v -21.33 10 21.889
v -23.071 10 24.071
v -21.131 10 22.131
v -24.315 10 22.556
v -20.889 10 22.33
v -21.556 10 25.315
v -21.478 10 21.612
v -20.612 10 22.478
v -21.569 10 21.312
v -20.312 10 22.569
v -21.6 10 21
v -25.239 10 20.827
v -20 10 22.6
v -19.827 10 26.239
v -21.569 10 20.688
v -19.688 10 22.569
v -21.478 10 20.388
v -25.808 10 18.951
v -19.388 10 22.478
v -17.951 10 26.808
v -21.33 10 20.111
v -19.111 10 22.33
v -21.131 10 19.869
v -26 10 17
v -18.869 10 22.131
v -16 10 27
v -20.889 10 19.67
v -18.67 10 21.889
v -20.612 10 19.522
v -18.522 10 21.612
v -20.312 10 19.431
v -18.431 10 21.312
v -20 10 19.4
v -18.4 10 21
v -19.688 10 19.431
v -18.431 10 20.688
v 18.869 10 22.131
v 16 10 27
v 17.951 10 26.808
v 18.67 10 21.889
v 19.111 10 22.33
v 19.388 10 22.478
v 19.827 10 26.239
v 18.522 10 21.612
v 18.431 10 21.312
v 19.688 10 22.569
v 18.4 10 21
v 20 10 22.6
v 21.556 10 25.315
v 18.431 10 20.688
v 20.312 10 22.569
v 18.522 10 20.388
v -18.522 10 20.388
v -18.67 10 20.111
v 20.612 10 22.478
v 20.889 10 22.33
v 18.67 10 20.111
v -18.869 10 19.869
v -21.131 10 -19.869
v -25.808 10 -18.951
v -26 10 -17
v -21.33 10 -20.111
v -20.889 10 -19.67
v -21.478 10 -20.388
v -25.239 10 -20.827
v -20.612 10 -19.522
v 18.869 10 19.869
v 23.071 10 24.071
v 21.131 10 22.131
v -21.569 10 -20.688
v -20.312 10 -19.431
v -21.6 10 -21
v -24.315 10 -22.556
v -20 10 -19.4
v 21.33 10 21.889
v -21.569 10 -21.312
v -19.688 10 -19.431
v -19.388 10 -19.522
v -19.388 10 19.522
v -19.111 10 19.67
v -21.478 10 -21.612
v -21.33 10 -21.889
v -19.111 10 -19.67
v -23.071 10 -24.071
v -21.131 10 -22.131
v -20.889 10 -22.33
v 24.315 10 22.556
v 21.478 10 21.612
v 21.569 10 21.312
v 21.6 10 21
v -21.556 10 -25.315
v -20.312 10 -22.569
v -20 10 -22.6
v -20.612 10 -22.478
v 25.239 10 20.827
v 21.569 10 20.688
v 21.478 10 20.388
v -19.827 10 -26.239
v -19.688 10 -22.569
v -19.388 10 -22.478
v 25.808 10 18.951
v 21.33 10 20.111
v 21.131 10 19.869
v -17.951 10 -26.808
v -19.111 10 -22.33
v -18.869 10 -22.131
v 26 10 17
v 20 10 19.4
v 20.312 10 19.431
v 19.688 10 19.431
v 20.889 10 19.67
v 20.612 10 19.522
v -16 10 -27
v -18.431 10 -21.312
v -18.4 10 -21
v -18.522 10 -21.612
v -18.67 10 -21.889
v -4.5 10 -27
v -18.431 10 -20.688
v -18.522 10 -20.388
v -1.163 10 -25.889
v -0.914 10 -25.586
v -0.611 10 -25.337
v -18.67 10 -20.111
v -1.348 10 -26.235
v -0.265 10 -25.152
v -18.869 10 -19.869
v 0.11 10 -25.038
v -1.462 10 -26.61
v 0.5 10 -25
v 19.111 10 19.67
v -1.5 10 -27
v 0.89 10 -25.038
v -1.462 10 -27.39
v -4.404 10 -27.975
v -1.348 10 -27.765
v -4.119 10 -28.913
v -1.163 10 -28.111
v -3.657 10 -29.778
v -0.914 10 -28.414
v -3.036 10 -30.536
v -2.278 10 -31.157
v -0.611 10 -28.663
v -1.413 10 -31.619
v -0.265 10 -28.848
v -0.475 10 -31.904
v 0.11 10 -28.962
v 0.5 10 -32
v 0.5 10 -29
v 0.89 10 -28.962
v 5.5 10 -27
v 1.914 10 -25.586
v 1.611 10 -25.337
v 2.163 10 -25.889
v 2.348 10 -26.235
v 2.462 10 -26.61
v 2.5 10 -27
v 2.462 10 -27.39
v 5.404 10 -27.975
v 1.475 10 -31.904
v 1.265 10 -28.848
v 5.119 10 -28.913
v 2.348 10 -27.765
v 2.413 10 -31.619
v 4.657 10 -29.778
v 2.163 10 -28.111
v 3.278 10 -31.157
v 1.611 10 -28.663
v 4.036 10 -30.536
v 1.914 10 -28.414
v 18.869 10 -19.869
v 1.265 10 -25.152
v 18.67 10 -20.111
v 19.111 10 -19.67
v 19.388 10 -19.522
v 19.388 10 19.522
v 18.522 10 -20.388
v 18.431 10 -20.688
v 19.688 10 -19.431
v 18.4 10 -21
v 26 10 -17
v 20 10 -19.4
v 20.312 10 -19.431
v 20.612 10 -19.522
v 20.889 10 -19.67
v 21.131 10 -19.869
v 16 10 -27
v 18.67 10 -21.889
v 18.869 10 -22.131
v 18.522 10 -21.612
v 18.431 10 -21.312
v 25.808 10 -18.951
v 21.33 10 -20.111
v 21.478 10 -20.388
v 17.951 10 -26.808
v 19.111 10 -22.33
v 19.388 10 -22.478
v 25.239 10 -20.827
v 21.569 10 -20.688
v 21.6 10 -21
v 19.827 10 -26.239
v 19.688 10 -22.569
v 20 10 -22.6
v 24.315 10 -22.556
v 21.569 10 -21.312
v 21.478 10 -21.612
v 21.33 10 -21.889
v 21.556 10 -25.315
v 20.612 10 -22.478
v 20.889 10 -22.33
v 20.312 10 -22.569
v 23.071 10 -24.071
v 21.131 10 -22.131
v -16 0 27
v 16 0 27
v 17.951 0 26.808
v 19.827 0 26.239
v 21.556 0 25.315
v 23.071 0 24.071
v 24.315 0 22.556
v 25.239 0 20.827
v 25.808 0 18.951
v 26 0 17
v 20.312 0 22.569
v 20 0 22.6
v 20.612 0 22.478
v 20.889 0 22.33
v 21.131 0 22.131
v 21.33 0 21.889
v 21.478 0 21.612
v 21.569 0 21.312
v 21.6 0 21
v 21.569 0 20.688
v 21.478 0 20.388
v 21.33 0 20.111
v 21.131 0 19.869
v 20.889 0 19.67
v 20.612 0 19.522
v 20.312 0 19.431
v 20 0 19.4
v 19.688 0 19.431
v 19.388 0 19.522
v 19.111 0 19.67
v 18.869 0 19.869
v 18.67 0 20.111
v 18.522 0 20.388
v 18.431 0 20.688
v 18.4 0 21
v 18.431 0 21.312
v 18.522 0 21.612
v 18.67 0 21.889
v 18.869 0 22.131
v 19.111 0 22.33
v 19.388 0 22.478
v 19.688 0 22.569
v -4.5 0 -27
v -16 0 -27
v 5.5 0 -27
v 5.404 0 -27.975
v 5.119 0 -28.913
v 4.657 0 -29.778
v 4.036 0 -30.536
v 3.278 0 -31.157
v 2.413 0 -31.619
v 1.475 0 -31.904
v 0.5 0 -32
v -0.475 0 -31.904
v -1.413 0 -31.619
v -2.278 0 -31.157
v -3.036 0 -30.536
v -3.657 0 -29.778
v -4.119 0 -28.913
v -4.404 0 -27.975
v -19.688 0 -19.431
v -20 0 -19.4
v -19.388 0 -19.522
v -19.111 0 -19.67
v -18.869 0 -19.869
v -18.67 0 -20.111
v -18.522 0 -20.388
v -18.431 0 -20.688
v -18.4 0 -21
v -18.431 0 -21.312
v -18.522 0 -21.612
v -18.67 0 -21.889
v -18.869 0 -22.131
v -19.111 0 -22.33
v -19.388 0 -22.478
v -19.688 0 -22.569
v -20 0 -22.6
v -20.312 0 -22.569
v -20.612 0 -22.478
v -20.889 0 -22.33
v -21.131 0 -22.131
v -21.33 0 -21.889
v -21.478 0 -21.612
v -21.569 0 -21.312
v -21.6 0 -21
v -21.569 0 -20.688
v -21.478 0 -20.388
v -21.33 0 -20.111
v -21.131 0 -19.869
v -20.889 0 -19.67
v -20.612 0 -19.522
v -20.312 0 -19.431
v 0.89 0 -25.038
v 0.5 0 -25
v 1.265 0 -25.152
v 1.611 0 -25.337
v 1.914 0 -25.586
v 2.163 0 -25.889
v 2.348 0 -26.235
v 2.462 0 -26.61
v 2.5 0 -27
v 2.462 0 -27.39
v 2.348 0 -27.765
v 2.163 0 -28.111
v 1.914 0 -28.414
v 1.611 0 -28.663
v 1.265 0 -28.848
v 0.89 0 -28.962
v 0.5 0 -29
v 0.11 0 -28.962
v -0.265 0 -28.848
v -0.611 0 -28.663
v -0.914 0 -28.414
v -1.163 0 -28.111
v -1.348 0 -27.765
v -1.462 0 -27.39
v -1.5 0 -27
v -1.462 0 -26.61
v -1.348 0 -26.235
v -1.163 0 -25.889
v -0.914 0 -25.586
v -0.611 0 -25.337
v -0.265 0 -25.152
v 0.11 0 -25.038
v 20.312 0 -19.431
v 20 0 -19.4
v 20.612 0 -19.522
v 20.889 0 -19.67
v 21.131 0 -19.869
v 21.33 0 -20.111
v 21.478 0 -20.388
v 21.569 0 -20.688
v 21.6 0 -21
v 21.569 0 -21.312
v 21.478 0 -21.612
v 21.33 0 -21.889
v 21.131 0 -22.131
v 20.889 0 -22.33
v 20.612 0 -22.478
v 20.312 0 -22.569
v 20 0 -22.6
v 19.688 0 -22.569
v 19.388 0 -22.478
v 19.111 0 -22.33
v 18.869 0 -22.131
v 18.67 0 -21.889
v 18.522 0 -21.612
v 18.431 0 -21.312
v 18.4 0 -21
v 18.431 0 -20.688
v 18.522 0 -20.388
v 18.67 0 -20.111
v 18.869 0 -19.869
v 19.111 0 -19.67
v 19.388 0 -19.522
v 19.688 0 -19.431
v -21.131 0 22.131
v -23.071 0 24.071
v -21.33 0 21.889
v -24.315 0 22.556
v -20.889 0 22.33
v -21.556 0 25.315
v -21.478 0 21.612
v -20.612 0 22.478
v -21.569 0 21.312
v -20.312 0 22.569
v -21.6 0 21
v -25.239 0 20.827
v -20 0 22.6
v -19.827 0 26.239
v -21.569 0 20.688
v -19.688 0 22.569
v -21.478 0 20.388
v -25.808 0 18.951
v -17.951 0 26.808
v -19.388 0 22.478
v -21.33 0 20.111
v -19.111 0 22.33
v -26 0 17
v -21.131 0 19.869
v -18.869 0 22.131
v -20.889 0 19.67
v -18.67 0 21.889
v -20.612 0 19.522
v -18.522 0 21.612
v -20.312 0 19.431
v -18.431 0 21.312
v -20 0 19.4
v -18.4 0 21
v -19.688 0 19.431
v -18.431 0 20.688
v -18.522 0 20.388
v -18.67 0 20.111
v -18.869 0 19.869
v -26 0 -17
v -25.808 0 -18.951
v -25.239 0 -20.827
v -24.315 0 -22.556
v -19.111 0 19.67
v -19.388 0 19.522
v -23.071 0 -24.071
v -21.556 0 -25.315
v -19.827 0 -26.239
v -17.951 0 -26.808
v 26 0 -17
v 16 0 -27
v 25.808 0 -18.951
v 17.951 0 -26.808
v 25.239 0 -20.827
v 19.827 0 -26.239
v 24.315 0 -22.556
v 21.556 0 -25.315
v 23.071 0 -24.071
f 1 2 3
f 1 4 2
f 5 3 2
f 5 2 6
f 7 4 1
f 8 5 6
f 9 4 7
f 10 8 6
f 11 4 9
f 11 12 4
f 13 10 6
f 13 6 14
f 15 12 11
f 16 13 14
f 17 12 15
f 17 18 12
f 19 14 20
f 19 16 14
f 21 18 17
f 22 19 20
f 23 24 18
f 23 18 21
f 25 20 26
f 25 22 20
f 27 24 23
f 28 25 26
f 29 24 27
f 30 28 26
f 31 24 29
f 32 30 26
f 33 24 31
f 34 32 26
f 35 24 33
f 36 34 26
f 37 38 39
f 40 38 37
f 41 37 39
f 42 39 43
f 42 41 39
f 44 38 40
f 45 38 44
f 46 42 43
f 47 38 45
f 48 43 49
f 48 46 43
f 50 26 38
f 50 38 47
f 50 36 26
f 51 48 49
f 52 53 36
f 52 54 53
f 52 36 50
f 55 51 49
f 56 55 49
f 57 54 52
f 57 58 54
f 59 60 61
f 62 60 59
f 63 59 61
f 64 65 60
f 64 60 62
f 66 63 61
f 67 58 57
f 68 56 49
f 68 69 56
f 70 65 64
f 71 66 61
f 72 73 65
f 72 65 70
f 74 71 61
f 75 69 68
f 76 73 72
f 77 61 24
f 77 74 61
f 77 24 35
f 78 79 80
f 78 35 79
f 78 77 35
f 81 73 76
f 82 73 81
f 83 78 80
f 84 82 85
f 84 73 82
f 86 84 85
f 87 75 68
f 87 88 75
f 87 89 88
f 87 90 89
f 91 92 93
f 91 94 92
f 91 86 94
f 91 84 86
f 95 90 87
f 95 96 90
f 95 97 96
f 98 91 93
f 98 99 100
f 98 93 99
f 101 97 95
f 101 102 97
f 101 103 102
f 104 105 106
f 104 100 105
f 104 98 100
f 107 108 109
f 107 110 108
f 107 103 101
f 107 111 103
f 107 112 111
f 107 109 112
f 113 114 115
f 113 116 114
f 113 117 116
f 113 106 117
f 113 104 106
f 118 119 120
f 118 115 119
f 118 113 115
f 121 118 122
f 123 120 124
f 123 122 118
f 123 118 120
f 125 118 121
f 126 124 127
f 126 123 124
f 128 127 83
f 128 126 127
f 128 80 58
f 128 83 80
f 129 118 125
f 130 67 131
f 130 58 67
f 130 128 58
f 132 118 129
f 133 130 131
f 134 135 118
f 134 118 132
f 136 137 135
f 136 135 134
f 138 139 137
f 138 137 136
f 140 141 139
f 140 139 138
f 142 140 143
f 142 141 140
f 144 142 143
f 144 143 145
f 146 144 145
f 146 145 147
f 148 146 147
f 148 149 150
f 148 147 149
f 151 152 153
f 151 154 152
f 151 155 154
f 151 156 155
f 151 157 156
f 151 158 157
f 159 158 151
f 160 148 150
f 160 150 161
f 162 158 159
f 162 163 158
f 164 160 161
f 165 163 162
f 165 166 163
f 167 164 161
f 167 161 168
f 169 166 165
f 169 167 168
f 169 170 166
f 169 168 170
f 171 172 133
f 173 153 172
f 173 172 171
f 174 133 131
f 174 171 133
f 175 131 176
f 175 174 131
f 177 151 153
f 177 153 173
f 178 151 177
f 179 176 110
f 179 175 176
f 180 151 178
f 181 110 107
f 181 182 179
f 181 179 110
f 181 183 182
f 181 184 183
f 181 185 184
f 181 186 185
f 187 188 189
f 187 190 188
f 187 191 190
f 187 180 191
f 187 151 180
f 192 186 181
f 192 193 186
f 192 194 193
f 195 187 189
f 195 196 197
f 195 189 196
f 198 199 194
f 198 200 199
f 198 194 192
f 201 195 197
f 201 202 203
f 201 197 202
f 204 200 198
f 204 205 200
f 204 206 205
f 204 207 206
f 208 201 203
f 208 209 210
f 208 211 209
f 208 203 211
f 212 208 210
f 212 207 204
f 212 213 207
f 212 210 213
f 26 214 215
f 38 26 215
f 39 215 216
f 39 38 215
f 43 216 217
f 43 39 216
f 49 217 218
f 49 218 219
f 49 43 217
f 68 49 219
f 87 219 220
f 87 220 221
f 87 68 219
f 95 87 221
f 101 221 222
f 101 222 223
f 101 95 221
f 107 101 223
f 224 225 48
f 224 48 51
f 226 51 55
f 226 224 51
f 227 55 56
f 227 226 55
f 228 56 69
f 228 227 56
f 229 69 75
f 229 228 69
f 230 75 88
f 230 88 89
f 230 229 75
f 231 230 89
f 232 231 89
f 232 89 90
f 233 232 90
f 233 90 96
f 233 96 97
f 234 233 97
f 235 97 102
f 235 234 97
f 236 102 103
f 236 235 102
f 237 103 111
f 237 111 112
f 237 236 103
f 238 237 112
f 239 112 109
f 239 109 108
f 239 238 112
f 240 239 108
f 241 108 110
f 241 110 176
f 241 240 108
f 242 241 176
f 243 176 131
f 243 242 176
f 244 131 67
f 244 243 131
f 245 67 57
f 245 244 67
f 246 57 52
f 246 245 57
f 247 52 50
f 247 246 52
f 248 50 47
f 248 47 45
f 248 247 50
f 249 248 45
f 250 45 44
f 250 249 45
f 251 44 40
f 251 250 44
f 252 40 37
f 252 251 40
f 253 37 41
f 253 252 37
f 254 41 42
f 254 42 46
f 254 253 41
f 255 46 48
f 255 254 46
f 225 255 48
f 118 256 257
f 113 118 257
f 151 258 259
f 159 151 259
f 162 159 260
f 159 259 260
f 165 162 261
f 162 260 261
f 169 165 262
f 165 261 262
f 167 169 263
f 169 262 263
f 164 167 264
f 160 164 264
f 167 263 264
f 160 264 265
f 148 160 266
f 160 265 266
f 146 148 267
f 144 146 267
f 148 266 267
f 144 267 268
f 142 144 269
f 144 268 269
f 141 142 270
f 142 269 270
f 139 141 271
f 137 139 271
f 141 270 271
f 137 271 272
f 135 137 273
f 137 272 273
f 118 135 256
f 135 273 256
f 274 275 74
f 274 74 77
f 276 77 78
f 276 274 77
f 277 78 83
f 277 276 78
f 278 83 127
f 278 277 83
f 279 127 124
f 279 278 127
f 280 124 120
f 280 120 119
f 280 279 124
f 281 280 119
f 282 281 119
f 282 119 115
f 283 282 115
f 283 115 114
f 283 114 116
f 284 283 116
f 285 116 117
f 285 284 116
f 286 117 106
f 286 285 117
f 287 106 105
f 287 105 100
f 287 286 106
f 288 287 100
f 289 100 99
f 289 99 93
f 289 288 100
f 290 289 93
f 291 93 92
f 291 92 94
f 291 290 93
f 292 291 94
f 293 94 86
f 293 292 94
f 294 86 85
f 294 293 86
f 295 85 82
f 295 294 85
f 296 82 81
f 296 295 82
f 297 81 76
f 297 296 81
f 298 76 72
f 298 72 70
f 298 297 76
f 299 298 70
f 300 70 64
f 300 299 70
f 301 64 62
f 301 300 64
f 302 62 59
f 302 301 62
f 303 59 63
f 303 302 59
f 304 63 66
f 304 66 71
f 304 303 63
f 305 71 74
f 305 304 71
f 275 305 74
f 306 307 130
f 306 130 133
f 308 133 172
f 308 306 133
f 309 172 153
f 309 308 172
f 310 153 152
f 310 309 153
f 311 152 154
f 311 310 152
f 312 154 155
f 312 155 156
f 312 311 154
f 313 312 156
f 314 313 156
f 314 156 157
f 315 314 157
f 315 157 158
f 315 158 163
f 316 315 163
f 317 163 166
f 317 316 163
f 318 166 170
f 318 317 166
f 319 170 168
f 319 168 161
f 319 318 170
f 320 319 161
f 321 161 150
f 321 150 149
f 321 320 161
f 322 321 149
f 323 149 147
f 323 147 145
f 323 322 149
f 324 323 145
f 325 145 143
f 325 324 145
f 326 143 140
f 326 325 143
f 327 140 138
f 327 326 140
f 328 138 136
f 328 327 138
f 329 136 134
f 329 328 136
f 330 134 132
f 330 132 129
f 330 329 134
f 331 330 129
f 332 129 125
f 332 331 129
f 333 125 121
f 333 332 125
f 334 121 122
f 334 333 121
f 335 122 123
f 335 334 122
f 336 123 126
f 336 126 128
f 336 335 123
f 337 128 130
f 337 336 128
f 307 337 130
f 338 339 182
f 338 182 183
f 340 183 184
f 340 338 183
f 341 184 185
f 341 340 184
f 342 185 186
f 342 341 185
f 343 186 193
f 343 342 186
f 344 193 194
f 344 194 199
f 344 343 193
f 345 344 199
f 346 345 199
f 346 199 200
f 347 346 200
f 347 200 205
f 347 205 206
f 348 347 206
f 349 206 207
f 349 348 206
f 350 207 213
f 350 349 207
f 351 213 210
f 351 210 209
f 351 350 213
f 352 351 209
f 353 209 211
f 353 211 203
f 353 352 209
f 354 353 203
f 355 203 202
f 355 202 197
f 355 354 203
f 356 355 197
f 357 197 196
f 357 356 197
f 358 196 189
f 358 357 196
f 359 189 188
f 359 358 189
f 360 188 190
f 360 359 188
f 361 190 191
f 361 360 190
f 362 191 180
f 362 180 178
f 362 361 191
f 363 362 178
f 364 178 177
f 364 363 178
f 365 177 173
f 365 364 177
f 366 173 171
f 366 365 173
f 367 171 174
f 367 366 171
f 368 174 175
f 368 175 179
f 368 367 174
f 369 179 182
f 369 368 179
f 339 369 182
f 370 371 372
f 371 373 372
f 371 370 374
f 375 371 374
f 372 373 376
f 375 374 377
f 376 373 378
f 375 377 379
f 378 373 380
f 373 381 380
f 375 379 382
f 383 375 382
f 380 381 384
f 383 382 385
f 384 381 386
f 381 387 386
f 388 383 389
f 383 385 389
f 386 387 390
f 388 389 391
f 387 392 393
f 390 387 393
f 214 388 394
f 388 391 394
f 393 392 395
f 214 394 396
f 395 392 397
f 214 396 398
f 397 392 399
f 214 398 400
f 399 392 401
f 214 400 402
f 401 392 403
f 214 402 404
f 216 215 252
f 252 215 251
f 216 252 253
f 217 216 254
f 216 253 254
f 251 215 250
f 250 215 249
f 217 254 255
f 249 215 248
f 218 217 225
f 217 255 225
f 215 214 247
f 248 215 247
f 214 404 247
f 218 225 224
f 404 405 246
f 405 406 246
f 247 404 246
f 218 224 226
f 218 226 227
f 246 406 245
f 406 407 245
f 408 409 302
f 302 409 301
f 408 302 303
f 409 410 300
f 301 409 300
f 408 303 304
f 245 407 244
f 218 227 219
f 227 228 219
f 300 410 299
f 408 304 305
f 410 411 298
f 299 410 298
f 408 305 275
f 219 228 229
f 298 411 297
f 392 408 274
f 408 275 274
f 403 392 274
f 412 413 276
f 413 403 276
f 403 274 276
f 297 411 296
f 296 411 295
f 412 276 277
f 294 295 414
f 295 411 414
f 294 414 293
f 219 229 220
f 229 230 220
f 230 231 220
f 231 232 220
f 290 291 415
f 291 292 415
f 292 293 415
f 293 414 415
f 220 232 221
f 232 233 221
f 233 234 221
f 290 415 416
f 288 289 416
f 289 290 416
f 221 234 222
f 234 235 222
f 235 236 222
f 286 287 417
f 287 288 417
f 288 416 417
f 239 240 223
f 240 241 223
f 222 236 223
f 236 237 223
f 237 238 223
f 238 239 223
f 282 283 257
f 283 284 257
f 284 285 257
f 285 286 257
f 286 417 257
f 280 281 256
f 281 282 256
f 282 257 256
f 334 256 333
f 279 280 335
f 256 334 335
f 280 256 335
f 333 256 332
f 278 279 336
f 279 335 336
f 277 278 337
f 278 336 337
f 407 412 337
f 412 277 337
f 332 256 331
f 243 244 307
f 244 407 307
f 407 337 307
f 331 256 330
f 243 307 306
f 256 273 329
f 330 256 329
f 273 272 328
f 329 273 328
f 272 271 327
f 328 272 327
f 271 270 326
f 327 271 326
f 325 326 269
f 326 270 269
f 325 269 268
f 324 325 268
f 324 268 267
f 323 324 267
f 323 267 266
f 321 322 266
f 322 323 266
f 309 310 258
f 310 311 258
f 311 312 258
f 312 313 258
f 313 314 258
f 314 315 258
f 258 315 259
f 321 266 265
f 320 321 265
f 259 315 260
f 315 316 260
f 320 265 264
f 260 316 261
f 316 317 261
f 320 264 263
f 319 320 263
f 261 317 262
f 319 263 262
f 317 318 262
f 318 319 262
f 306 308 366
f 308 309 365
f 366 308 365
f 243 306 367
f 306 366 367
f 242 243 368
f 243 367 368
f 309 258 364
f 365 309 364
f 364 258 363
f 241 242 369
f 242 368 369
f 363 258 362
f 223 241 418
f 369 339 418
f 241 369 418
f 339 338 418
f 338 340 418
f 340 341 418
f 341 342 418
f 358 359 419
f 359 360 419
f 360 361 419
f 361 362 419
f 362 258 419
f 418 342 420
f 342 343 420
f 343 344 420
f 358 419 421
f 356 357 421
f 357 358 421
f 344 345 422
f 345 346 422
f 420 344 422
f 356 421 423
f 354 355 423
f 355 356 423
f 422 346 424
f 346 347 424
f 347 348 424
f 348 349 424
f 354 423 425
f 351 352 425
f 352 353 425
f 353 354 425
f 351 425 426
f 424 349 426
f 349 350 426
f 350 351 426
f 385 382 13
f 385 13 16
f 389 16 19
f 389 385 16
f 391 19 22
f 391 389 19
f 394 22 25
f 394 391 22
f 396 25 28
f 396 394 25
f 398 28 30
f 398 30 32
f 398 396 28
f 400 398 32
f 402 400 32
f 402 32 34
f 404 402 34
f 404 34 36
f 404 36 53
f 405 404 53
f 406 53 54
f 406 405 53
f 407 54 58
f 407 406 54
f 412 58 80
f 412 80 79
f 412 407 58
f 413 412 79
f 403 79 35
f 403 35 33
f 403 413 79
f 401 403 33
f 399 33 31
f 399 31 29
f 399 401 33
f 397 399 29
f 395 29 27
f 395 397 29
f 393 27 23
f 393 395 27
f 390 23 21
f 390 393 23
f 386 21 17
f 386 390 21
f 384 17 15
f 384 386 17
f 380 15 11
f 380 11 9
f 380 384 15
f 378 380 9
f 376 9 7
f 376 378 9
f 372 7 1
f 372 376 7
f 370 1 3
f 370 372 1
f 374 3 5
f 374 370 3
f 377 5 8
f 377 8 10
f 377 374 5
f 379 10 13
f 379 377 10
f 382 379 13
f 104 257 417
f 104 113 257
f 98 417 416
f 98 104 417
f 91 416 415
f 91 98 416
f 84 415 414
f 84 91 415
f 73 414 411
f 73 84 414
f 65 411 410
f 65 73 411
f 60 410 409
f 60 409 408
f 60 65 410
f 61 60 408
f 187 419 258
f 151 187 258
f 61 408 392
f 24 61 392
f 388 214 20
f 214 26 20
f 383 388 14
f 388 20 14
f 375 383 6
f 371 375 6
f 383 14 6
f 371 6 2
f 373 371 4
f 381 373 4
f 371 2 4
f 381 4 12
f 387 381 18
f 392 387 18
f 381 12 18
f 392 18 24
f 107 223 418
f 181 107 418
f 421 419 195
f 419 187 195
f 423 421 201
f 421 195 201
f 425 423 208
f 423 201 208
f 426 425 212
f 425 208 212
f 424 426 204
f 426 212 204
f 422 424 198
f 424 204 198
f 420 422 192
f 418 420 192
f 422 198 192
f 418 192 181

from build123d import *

# Parameters (mm, degrees)
SKETCH1_R           = 1.6
SKETCH1_R_2         = 2
BOSS_EXTRUDE1_DEPTH = 10
FILLET1_R           = 10
FILLET2_R           = 10
FILLET3_R           = 10
FILLET4_R           = 10


with BuildPart() as part:
    # Sketch1 → Boss-Extrude1 (new body)
    with BuildSketch(Plane(origin=(0, 0, 0), x_dir=(1, 0, 0), z_dir=(0, 1, 0))):
        with BuildLine():
            Line((-4.5, 27), (-26, 27))
            Line((-26, 27), (-26, -27))
            Line((-26, -27), (26, -27))
            Line((26, -27), (26, 27))
            Line((26, 27), (5.5, 27))
            ThreePointArc((5.5, 27), (0.5, 32), (-4.5, 27))
        make_face()
        with Locations(Location((-20, 21, 0), (0, 0, 270))):  # turned: the seam where the file's is
            Circle(SKETCH1_R, mode=Mode.SUBTRACT)
        with Locations(Location((20, 21, 0), (0, 0, 270))):  # turned: the seam where the file's is
            Circle(SKETCH1_R, mode=Mode.SUBTRACT)
        with Locations(Location((20, -21, 0), (0, 0, 270))):  # turned: the seam where the file's is
            Circle(SKETCH1_R, mode=Mode.SUBTRACT)
        with Locations(Location((-20, -21, 0), (0, 0, 270))):  # turned: the seam where the file's is
            Circle(SKETCH1_R, mode=Mode.SUBTRACT)
        with Locations(Location((0.5, 27, 0), (0, 0, 270))):  # turned: the seam where the file's is
            Circle(SKETCH1_R_2, mode=Mode.SUBTRACT)
    extrude(amount=BOSS_EXTRUDE1_DEPTH)

    # Fillet1
    fillet1_edges = [part.edges().sort_by_distance(p)[0] for p in [
        (-26, 5, -27),
    ]]
    fillet(fillet1_edges, radius=FILLET1_R)

    # Fillet2
    fillet2_edges = [part.edges().sort_by_distance(p)[0] for p in [
        (26, 5, -27),
    ]]
    fillet(fillet2_edges, radius=FILLET2_R)

    # Fillet3
    fillet3_edges = [part.edges().sort_by_distance(p)[0] for p in [
        (-26, 5, 27),
    ]]
    fillet(fillet3_edges, radius=FILLET3_R)

    # Fillet4
    fillet4_edges = [part.edges().sort_by_distance(p)[0] for p in [
        (26, 5, 27),
    ]]
    fillet(fillet4_edges, radius=FILLET4_R)


solid = part.part
